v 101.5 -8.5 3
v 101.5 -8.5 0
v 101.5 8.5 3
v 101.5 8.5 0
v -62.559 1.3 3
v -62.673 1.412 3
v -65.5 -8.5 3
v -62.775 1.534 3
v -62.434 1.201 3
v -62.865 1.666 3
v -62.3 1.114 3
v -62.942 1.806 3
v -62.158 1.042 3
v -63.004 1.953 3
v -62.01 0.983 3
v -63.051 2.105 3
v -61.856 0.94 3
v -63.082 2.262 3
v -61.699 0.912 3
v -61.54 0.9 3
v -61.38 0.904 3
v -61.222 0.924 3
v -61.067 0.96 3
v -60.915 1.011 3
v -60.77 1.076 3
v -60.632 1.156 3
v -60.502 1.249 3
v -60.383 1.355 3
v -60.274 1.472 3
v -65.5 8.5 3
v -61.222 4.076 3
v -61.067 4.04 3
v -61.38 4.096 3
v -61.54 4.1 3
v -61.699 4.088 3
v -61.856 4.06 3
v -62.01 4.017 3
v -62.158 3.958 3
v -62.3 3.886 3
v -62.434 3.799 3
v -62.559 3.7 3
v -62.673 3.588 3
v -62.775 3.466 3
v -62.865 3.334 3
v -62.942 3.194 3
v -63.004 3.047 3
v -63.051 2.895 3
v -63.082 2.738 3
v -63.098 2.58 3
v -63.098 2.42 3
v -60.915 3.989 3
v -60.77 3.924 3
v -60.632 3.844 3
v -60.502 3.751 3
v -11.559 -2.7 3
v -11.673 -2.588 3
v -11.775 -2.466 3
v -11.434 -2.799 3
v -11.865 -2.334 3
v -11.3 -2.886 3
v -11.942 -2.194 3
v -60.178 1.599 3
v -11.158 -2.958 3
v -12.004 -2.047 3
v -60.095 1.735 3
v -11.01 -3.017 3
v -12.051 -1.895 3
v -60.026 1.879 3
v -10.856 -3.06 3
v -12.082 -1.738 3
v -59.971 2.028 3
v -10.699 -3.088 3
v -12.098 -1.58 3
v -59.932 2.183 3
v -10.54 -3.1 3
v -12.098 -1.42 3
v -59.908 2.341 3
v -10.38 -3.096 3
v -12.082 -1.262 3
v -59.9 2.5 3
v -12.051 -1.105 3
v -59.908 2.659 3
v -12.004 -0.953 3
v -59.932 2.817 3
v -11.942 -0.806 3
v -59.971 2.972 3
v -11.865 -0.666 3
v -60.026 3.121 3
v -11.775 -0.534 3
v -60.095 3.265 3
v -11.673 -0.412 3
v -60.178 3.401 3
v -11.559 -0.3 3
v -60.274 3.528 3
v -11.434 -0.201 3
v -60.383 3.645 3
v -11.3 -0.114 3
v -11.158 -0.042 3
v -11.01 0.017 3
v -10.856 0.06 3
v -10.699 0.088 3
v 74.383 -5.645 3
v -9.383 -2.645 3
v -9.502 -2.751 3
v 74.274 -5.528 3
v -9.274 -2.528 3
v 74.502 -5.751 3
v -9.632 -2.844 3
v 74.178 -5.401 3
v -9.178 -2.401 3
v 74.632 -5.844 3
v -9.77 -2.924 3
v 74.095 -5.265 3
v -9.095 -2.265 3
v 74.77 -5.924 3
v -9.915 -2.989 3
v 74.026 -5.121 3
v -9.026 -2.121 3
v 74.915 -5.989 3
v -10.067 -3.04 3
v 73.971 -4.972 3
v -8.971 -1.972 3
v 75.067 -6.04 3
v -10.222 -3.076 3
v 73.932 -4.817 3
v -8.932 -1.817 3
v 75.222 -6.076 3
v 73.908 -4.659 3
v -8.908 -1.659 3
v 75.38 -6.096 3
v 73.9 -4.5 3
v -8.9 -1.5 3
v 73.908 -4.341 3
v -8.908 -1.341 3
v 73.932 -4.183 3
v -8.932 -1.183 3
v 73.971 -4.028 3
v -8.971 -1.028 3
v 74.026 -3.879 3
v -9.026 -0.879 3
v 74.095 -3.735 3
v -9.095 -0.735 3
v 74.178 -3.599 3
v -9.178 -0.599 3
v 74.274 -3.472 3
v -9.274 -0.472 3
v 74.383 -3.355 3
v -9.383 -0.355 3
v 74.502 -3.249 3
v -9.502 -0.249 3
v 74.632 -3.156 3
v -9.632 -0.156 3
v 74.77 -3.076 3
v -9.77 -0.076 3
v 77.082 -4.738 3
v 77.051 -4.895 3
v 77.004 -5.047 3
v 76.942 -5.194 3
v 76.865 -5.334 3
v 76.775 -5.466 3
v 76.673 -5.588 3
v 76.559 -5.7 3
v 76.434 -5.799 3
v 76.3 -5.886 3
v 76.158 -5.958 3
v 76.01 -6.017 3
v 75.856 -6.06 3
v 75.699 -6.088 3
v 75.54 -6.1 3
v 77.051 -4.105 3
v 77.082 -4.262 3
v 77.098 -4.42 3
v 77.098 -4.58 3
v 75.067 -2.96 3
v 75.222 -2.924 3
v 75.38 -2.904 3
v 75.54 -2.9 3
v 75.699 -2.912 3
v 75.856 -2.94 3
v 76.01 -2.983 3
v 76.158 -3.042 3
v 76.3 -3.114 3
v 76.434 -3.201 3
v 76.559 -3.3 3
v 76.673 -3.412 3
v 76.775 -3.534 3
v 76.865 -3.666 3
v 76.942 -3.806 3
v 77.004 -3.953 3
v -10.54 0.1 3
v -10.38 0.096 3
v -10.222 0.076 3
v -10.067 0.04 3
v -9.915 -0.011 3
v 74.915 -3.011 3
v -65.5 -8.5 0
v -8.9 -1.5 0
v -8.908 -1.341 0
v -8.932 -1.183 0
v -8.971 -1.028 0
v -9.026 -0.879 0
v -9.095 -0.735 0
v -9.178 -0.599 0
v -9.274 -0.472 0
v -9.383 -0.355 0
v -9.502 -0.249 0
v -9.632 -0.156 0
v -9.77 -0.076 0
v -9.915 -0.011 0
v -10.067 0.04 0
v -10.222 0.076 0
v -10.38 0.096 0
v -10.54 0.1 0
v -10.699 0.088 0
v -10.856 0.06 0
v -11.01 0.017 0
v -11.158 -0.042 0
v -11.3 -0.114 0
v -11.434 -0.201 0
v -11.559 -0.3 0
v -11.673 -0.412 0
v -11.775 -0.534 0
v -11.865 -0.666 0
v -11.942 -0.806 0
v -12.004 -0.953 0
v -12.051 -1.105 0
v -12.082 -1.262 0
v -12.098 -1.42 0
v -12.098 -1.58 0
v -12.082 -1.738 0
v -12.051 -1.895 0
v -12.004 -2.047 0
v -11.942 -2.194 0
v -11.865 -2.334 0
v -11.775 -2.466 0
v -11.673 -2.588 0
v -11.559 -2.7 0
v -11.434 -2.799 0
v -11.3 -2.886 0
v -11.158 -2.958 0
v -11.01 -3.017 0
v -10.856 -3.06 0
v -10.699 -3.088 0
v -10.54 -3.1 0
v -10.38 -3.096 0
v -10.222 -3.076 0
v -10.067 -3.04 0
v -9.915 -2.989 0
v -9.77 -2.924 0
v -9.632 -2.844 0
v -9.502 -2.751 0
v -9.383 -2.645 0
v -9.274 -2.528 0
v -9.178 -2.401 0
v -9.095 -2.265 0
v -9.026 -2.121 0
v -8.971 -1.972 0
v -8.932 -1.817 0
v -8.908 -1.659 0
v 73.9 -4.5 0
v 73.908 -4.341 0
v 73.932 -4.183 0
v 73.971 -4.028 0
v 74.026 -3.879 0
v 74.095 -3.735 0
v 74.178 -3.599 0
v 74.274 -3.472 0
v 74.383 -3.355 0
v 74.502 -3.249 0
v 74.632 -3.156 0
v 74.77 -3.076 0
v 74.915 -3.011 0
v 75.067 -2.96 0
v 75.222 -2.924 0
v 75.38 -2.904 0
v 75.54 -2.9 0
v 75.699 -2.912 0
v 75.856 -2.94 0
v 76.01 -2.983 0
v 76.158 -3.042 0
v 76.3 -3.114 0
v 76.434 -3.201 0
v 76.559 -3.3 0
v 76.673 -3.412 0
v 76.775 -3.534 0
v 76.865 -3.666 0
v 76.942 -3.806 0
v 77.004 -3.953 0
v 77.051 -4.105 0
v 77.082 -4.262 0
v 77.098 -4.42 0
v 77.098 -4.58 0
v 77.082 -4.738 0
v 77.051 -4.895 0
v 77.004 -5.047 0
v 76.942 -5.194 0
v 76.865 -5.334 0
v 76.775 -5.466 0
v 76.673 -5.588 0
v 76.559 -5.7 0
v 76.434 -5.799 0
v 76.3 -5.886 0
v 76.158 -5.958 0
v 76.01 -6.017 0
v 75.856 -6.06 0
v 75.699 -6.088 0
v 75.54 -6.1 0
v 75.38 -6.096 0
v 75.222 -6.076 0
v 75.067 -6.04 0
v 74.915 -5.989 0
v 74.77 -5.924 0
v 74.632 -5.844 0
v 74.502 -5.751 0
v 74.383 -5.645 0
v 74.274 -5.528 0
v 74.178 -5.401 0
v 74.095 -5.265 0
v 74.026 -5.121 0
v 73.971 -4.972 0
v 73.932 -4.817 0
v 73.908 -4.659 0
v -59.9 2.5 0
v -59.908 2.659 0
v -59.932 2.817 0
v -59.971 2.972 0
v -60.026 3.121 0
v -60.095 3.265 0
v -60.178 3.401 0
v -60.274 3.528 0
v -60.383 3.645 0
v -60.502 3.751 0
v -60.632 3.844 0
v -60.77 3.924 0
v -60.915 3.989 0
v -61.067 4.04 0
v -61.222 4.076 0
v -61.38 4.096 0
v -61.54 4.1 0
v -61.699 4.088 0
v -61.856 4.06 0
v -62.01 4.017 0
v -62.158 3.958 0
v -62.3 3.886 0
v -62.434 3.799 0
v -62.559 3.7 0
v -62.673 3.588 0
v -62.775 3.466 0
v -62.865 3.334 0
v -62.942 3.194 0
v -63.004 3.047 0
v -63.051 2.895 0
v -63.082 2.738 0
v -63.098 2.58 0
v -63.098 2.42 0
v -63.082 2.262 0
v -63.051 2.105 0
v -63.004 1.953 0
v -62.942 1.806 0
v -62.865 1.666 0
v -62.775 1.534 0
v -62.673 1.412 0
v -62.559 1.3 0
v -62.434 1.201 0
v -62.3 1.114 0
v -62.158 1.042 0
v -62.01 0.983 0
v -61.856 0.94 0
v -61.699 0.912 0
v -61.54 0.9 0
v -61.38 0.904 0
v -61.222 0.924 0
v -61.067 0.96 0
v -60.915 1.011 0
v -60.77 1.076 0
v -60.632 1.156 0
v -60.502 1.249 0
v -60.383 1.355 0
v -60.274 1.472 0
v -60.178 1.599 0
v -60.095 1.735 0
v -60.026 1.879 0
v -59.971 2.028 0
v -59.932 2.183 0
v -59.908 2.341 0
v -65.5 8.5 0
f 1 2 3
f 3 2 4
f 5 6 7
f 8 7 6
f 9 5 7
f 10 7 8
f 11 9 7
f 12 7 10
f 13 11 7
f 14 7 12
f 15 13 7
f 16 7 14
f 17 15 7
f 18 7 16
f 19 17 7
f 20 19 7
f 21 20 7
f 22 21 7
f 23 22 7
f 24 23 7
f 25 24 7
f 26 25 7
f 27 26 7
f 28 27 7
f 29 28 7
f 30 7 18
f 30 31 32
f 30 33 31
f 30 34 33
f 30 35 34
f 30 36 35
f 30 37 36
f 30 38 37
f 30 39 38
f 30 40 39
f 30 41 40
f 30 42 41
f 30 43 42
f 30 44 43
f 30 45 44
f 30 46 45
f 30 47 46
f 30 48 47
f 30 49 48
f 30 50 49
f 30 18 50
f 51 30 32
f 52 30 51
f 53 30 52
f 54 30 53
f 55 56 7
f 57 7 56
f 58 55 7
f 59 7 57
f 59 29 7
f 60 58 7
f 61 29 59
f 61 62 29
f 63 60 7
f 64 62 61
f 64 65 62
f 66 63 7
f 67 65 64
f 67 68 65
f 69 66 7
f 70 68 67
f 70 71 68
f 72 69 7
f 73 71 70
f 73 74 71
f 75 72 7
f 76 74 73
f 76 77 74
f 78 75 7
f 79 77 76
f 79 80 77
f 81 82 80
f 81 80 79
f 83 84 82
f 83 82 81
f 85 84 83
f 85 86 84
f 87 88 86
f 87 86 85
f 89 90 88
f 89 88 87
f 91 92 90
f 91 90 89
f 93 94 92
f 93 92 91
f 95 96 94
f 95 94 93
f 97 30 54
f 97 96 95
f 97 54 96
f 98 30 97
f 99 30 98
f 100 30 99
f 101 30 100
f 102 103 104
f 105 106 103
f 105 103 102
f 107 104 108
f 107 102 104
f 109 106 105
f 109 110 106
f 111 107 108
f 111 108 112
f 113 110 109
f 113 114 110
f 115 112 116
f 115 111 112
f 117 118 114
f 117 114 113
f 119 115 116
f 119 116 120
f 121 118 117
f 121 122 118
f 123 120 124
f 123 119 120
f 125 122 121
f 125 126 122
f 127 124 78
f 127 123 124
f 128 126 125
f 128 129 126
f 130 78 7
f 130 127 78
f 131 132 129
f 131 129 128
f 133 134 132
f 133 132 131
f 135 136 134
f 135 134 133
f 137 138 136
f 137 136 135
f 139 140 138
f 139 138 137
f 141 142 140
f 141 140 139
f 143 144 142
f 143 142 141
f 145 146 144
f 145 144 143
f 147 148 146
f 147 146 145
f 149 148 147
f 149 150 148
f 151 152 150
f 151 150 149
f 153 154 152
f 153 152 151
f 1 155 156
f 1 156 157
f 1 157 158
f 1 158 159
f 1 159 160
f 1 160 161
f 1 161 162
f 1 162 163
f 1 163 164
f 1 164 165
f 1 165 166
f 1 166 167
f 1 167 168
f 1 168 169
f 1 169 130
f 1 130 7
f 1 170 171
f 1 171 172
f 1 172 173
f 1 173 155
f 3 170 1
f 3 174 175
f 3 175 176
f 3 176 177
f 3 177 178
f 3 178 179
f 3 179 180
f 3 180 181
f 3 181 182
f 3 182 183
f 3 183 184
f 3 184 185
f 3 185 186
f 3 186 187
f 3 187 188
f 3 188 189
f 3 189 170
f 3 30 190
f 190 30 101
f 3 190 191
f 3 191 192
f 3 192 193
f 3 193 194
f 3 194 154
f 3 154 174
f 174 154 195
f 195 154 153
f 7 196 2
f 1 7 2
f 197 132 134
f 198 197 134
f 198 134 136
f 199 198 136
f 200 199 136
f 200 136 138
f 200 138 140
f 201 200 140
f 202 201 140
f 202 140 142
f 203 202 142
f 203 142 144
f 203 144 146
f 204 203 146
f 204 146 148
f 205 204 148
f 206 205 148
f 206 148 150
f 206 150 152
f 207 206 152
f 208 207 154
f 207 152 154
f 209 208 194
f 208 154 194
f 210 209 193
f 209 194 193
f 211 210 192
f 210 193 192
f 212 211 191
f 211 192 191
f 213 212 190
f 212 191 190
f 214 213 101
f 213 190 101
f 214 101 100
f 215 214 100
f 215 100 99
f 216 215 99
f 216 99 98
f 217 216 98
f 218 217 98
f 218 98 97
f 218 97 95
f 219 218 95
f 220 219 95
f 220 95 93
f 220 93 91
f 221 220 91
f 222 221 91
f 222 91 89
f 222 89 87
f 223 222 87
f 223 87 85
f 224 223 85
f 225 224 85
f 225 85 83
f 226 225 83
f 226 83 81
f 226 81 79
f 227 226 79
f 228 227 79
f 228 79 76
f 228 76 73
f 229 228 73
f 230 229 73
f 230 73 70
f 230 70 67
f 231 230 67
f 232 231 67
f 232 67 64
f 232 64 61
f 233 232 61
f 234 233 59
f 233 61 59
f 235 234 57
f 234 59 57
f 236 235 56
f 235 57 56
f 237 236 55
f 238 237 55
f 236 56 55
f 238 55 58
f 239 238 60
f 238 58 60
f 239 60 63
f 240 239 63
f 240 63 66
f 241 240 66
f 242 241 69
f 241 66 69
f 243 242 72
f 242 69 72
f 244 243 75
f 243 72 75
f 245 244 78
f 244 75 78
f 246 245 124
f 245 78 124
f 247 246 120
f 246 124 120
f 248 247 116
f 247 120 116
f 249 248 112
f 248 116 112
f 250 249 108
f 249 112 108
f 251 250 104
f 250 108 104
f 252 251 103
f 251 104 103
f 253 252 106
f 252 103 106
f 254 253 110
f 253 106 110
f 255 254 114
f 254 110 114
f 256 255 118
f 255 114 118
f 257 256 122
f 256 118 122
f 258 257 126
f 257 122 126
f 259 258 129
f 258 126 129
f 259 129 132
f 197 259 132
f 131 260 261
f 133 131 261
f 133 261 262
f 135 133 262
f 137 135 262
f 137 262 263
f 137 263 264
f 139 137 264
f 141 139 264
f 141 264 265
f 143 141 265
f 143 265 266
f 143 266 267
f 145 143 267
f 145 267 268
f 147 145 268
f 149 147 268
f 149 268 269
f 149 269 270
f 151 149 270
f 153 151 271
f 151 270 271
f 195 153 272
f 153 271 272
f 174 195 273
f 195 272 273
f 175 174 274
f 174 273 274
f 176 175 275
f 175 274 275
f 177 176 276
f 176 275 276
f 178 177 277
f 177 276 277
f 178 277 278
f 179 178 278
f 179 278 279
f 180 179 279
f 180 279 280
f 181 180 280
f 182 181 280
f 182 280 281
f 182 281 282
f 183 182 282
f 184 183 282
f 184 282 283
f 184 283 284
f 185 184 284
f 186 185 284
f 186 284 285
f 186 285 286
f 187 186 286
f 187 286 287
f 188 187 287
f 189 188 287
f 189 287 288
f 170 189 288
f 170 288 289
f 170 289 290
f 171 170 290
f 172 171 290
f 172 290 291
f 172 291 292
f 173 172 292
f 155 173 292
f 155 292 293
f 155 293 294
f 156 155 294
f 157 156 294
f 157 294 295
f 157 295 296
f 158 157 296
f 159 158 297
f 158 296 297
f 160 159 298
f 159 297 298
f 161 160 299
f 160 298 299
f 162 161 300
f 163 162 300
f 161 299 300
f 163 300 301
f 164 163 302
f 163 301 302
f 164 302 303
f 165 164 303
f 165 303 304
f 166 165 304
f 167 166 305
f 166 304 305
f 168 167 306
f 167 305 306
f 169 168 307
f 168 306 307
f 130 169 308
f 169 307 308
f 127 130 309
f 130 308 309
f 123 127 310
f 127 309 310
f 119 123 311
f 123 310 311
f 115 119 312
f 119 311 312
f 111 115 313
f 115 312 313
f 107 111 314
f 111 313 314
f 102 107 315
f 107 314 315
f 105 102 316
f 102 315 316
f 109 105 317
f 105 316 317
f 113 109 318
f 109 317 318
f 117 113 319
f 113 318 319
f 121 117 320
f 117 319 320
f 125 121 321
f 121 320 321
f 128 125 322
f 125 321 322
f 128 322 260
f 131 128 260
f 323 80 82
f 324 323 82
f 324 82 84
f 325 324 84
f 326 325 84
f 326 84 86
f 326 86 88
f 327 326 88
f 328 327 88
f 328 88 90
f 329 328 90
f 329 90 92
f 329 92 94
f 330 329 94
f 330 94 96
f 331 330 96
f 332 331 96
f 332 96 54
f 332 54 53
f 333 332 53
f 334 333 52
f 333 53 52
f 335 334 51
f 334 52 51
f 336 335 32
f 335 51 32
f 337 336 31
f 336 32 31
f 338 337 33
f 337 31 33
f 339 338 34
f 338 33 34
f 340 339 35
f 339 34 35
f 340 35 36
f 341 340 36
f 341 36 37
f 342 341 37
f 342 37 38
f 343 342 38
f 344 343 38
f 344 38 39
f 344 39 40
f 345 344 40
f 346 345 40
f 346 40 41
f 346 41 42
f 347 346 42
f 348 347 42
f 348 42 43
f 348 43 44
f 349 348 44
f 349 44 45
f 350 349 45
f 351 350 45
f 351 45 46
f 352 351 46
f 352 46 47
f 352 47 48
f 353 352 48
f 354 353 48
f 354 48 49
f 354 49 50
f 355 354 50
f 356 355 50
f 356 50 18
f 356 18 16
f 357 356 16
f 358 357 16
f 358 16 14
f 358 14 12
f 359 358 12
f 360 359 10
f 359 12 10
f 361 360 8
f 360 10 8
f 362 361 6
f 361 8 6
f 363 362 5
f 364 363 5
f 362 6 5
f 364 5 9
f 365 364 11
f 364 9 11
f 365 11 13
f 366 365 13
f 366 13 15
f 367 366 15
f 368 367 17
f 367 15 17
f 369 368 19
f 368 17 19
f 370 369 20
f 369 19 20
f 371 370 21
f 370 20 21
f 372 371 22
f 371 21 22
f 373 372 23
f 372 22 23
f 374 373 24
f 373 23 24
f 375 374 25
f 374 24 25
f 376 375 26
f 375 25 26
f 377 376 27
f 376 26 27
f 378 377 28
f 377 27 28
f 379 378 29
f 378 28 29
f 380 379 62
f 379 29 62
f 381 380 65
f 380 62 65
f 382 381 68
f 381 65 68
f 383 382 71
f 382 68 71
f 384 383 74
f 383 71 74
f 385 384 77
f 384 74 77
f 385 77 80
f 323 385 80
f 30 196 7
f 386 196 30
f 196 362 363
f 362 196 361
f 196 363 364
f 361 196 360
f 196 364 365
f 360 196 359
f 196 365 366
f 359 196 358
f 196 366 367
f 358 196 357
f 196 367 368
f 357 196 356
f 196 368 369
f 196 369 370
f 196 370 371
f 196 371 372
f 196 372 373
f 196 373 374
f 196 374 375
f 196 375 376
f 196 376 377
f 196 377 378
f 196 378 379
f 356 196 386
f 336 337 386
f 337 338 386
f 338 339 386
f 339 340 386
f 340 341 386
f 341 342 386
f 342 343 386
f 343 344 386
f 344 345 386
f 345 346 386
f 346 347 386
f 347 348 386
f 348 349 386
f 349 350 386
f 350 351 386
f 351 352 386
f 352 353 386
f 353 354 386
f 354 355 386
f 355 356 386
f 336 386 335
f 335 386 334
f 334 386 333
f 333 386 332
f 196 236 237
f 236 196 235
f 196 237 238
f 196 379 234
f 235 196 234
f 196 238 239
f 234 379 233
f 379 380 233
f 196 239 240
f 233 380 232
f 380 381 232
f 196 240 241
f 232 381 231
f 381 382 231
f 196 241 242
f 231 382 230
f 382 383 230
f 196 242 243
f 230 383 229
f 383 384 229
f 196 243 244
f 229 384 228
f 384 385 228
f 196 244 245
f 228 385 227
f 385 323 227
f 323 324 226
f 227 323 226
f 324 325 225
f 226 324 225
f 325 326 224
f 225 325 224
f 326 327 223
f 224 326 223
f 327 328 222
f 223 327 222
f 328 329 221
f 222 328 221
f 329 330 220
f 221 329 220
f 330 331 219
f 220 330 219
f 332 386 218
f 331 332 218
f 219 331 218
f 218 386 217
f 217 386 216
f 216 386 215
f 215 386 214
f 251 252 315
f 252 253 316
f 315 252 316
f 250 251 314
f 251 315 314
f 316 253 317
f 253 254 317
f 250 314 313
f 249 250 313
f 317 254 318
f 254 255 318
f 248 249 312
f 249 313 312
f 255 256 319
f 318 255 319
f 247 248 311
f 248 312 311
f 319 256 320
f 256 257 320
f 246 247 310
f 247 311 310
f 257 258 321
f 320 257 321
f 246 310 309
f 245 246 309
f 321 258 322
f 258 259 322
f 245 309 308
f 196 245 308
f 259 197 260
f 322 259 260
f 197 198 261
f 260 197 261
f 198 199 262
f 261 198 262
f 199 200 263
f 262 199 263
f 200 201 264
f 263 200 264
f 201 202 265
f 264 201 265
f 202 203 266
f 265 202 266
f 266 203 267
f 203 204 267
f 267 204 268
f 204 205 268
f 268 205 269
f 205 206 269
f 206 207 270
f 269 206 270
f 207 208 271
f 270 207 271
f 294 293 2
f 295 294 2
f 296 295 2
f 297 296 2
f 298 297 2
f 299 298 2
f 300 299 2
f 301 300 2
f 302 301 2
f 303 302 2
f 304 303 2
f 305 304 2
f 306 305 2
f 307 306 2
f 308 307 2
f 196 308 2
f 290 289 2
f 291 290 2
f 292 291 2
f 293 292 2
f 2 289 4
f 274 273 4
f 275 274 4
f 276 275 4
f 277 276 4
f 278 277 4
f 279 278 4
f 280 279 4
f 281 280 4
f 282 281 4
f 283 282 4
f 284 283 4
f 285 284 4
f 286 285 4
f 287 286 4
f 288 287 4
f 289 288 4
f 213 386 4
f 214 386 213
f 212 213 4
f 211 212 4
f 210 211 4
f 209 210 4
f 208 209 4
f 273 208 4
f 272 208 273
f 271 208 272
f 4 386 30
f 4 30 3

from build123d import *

# Parameters (mm, degrees)
ESQUISSE1_W        = 167
ESQUISSE1_H        = 17
BOSS_EXTRU_1_DEPTH = 3
SKETCH1_R          = 1.6
CUT_EXTRUDE1_DEPTH = 102.899460254
SKETCH2_R          = 1.6
CUT_EXTRUDE2_DEPTH = 102.899460254
SKETCH3_R          = 1.6
CUT_EXTRUDE3_DEPTH = 102.899460254


with BuildPart() as part:
    # Esquisse1 → Boss.-Extru.1 (new body)
    with BuildSketch(Plane.XY):
        with Locations((18, 0)):
            Rectangle(ESQUISSE1_W, ESQUISSE1_H)
    extrude(amount=BOSS_EXTRU_1_DEPTH)

    # Sketch1 → Cut-Extrude1 (cut, through all)
    with BuildSketch(Plane.XY.offset(3)):
        with Locations((-61.5, 2.5)):
            Circle(SKETCH1_R)
    extrude(amount=-CUT_EXTRUDE1_DEPTH, mode=Mode.SUBTRACT)

    # Sketch2 → Cut-Extrude2 (cut, through all)
    with BuildSketch(Plane(origin=(0, 0, 0), x_dir=(-1, 0, 0), z_dir=(0, 0, -1))):
        with Locations((-75.5, -4.5)):
            Circle(SKETCH2_R)
    extrude(amount=-CUT_EXTRUDE2_DEPTH, mode=Mode.SUBTRACT)

    # Sketch3 → Cut-Extrude3 (cut, through all)
    with BuildSketch(Plane.XY.offset(3)):
        with Locations((-10.5, -1.5)):
            Circle(SKETCH3_R)
    extrude(amount=-CUT_EXTRUDE3_DEPTH, mode=Mode.SUBTRACT)


solid = part.part
